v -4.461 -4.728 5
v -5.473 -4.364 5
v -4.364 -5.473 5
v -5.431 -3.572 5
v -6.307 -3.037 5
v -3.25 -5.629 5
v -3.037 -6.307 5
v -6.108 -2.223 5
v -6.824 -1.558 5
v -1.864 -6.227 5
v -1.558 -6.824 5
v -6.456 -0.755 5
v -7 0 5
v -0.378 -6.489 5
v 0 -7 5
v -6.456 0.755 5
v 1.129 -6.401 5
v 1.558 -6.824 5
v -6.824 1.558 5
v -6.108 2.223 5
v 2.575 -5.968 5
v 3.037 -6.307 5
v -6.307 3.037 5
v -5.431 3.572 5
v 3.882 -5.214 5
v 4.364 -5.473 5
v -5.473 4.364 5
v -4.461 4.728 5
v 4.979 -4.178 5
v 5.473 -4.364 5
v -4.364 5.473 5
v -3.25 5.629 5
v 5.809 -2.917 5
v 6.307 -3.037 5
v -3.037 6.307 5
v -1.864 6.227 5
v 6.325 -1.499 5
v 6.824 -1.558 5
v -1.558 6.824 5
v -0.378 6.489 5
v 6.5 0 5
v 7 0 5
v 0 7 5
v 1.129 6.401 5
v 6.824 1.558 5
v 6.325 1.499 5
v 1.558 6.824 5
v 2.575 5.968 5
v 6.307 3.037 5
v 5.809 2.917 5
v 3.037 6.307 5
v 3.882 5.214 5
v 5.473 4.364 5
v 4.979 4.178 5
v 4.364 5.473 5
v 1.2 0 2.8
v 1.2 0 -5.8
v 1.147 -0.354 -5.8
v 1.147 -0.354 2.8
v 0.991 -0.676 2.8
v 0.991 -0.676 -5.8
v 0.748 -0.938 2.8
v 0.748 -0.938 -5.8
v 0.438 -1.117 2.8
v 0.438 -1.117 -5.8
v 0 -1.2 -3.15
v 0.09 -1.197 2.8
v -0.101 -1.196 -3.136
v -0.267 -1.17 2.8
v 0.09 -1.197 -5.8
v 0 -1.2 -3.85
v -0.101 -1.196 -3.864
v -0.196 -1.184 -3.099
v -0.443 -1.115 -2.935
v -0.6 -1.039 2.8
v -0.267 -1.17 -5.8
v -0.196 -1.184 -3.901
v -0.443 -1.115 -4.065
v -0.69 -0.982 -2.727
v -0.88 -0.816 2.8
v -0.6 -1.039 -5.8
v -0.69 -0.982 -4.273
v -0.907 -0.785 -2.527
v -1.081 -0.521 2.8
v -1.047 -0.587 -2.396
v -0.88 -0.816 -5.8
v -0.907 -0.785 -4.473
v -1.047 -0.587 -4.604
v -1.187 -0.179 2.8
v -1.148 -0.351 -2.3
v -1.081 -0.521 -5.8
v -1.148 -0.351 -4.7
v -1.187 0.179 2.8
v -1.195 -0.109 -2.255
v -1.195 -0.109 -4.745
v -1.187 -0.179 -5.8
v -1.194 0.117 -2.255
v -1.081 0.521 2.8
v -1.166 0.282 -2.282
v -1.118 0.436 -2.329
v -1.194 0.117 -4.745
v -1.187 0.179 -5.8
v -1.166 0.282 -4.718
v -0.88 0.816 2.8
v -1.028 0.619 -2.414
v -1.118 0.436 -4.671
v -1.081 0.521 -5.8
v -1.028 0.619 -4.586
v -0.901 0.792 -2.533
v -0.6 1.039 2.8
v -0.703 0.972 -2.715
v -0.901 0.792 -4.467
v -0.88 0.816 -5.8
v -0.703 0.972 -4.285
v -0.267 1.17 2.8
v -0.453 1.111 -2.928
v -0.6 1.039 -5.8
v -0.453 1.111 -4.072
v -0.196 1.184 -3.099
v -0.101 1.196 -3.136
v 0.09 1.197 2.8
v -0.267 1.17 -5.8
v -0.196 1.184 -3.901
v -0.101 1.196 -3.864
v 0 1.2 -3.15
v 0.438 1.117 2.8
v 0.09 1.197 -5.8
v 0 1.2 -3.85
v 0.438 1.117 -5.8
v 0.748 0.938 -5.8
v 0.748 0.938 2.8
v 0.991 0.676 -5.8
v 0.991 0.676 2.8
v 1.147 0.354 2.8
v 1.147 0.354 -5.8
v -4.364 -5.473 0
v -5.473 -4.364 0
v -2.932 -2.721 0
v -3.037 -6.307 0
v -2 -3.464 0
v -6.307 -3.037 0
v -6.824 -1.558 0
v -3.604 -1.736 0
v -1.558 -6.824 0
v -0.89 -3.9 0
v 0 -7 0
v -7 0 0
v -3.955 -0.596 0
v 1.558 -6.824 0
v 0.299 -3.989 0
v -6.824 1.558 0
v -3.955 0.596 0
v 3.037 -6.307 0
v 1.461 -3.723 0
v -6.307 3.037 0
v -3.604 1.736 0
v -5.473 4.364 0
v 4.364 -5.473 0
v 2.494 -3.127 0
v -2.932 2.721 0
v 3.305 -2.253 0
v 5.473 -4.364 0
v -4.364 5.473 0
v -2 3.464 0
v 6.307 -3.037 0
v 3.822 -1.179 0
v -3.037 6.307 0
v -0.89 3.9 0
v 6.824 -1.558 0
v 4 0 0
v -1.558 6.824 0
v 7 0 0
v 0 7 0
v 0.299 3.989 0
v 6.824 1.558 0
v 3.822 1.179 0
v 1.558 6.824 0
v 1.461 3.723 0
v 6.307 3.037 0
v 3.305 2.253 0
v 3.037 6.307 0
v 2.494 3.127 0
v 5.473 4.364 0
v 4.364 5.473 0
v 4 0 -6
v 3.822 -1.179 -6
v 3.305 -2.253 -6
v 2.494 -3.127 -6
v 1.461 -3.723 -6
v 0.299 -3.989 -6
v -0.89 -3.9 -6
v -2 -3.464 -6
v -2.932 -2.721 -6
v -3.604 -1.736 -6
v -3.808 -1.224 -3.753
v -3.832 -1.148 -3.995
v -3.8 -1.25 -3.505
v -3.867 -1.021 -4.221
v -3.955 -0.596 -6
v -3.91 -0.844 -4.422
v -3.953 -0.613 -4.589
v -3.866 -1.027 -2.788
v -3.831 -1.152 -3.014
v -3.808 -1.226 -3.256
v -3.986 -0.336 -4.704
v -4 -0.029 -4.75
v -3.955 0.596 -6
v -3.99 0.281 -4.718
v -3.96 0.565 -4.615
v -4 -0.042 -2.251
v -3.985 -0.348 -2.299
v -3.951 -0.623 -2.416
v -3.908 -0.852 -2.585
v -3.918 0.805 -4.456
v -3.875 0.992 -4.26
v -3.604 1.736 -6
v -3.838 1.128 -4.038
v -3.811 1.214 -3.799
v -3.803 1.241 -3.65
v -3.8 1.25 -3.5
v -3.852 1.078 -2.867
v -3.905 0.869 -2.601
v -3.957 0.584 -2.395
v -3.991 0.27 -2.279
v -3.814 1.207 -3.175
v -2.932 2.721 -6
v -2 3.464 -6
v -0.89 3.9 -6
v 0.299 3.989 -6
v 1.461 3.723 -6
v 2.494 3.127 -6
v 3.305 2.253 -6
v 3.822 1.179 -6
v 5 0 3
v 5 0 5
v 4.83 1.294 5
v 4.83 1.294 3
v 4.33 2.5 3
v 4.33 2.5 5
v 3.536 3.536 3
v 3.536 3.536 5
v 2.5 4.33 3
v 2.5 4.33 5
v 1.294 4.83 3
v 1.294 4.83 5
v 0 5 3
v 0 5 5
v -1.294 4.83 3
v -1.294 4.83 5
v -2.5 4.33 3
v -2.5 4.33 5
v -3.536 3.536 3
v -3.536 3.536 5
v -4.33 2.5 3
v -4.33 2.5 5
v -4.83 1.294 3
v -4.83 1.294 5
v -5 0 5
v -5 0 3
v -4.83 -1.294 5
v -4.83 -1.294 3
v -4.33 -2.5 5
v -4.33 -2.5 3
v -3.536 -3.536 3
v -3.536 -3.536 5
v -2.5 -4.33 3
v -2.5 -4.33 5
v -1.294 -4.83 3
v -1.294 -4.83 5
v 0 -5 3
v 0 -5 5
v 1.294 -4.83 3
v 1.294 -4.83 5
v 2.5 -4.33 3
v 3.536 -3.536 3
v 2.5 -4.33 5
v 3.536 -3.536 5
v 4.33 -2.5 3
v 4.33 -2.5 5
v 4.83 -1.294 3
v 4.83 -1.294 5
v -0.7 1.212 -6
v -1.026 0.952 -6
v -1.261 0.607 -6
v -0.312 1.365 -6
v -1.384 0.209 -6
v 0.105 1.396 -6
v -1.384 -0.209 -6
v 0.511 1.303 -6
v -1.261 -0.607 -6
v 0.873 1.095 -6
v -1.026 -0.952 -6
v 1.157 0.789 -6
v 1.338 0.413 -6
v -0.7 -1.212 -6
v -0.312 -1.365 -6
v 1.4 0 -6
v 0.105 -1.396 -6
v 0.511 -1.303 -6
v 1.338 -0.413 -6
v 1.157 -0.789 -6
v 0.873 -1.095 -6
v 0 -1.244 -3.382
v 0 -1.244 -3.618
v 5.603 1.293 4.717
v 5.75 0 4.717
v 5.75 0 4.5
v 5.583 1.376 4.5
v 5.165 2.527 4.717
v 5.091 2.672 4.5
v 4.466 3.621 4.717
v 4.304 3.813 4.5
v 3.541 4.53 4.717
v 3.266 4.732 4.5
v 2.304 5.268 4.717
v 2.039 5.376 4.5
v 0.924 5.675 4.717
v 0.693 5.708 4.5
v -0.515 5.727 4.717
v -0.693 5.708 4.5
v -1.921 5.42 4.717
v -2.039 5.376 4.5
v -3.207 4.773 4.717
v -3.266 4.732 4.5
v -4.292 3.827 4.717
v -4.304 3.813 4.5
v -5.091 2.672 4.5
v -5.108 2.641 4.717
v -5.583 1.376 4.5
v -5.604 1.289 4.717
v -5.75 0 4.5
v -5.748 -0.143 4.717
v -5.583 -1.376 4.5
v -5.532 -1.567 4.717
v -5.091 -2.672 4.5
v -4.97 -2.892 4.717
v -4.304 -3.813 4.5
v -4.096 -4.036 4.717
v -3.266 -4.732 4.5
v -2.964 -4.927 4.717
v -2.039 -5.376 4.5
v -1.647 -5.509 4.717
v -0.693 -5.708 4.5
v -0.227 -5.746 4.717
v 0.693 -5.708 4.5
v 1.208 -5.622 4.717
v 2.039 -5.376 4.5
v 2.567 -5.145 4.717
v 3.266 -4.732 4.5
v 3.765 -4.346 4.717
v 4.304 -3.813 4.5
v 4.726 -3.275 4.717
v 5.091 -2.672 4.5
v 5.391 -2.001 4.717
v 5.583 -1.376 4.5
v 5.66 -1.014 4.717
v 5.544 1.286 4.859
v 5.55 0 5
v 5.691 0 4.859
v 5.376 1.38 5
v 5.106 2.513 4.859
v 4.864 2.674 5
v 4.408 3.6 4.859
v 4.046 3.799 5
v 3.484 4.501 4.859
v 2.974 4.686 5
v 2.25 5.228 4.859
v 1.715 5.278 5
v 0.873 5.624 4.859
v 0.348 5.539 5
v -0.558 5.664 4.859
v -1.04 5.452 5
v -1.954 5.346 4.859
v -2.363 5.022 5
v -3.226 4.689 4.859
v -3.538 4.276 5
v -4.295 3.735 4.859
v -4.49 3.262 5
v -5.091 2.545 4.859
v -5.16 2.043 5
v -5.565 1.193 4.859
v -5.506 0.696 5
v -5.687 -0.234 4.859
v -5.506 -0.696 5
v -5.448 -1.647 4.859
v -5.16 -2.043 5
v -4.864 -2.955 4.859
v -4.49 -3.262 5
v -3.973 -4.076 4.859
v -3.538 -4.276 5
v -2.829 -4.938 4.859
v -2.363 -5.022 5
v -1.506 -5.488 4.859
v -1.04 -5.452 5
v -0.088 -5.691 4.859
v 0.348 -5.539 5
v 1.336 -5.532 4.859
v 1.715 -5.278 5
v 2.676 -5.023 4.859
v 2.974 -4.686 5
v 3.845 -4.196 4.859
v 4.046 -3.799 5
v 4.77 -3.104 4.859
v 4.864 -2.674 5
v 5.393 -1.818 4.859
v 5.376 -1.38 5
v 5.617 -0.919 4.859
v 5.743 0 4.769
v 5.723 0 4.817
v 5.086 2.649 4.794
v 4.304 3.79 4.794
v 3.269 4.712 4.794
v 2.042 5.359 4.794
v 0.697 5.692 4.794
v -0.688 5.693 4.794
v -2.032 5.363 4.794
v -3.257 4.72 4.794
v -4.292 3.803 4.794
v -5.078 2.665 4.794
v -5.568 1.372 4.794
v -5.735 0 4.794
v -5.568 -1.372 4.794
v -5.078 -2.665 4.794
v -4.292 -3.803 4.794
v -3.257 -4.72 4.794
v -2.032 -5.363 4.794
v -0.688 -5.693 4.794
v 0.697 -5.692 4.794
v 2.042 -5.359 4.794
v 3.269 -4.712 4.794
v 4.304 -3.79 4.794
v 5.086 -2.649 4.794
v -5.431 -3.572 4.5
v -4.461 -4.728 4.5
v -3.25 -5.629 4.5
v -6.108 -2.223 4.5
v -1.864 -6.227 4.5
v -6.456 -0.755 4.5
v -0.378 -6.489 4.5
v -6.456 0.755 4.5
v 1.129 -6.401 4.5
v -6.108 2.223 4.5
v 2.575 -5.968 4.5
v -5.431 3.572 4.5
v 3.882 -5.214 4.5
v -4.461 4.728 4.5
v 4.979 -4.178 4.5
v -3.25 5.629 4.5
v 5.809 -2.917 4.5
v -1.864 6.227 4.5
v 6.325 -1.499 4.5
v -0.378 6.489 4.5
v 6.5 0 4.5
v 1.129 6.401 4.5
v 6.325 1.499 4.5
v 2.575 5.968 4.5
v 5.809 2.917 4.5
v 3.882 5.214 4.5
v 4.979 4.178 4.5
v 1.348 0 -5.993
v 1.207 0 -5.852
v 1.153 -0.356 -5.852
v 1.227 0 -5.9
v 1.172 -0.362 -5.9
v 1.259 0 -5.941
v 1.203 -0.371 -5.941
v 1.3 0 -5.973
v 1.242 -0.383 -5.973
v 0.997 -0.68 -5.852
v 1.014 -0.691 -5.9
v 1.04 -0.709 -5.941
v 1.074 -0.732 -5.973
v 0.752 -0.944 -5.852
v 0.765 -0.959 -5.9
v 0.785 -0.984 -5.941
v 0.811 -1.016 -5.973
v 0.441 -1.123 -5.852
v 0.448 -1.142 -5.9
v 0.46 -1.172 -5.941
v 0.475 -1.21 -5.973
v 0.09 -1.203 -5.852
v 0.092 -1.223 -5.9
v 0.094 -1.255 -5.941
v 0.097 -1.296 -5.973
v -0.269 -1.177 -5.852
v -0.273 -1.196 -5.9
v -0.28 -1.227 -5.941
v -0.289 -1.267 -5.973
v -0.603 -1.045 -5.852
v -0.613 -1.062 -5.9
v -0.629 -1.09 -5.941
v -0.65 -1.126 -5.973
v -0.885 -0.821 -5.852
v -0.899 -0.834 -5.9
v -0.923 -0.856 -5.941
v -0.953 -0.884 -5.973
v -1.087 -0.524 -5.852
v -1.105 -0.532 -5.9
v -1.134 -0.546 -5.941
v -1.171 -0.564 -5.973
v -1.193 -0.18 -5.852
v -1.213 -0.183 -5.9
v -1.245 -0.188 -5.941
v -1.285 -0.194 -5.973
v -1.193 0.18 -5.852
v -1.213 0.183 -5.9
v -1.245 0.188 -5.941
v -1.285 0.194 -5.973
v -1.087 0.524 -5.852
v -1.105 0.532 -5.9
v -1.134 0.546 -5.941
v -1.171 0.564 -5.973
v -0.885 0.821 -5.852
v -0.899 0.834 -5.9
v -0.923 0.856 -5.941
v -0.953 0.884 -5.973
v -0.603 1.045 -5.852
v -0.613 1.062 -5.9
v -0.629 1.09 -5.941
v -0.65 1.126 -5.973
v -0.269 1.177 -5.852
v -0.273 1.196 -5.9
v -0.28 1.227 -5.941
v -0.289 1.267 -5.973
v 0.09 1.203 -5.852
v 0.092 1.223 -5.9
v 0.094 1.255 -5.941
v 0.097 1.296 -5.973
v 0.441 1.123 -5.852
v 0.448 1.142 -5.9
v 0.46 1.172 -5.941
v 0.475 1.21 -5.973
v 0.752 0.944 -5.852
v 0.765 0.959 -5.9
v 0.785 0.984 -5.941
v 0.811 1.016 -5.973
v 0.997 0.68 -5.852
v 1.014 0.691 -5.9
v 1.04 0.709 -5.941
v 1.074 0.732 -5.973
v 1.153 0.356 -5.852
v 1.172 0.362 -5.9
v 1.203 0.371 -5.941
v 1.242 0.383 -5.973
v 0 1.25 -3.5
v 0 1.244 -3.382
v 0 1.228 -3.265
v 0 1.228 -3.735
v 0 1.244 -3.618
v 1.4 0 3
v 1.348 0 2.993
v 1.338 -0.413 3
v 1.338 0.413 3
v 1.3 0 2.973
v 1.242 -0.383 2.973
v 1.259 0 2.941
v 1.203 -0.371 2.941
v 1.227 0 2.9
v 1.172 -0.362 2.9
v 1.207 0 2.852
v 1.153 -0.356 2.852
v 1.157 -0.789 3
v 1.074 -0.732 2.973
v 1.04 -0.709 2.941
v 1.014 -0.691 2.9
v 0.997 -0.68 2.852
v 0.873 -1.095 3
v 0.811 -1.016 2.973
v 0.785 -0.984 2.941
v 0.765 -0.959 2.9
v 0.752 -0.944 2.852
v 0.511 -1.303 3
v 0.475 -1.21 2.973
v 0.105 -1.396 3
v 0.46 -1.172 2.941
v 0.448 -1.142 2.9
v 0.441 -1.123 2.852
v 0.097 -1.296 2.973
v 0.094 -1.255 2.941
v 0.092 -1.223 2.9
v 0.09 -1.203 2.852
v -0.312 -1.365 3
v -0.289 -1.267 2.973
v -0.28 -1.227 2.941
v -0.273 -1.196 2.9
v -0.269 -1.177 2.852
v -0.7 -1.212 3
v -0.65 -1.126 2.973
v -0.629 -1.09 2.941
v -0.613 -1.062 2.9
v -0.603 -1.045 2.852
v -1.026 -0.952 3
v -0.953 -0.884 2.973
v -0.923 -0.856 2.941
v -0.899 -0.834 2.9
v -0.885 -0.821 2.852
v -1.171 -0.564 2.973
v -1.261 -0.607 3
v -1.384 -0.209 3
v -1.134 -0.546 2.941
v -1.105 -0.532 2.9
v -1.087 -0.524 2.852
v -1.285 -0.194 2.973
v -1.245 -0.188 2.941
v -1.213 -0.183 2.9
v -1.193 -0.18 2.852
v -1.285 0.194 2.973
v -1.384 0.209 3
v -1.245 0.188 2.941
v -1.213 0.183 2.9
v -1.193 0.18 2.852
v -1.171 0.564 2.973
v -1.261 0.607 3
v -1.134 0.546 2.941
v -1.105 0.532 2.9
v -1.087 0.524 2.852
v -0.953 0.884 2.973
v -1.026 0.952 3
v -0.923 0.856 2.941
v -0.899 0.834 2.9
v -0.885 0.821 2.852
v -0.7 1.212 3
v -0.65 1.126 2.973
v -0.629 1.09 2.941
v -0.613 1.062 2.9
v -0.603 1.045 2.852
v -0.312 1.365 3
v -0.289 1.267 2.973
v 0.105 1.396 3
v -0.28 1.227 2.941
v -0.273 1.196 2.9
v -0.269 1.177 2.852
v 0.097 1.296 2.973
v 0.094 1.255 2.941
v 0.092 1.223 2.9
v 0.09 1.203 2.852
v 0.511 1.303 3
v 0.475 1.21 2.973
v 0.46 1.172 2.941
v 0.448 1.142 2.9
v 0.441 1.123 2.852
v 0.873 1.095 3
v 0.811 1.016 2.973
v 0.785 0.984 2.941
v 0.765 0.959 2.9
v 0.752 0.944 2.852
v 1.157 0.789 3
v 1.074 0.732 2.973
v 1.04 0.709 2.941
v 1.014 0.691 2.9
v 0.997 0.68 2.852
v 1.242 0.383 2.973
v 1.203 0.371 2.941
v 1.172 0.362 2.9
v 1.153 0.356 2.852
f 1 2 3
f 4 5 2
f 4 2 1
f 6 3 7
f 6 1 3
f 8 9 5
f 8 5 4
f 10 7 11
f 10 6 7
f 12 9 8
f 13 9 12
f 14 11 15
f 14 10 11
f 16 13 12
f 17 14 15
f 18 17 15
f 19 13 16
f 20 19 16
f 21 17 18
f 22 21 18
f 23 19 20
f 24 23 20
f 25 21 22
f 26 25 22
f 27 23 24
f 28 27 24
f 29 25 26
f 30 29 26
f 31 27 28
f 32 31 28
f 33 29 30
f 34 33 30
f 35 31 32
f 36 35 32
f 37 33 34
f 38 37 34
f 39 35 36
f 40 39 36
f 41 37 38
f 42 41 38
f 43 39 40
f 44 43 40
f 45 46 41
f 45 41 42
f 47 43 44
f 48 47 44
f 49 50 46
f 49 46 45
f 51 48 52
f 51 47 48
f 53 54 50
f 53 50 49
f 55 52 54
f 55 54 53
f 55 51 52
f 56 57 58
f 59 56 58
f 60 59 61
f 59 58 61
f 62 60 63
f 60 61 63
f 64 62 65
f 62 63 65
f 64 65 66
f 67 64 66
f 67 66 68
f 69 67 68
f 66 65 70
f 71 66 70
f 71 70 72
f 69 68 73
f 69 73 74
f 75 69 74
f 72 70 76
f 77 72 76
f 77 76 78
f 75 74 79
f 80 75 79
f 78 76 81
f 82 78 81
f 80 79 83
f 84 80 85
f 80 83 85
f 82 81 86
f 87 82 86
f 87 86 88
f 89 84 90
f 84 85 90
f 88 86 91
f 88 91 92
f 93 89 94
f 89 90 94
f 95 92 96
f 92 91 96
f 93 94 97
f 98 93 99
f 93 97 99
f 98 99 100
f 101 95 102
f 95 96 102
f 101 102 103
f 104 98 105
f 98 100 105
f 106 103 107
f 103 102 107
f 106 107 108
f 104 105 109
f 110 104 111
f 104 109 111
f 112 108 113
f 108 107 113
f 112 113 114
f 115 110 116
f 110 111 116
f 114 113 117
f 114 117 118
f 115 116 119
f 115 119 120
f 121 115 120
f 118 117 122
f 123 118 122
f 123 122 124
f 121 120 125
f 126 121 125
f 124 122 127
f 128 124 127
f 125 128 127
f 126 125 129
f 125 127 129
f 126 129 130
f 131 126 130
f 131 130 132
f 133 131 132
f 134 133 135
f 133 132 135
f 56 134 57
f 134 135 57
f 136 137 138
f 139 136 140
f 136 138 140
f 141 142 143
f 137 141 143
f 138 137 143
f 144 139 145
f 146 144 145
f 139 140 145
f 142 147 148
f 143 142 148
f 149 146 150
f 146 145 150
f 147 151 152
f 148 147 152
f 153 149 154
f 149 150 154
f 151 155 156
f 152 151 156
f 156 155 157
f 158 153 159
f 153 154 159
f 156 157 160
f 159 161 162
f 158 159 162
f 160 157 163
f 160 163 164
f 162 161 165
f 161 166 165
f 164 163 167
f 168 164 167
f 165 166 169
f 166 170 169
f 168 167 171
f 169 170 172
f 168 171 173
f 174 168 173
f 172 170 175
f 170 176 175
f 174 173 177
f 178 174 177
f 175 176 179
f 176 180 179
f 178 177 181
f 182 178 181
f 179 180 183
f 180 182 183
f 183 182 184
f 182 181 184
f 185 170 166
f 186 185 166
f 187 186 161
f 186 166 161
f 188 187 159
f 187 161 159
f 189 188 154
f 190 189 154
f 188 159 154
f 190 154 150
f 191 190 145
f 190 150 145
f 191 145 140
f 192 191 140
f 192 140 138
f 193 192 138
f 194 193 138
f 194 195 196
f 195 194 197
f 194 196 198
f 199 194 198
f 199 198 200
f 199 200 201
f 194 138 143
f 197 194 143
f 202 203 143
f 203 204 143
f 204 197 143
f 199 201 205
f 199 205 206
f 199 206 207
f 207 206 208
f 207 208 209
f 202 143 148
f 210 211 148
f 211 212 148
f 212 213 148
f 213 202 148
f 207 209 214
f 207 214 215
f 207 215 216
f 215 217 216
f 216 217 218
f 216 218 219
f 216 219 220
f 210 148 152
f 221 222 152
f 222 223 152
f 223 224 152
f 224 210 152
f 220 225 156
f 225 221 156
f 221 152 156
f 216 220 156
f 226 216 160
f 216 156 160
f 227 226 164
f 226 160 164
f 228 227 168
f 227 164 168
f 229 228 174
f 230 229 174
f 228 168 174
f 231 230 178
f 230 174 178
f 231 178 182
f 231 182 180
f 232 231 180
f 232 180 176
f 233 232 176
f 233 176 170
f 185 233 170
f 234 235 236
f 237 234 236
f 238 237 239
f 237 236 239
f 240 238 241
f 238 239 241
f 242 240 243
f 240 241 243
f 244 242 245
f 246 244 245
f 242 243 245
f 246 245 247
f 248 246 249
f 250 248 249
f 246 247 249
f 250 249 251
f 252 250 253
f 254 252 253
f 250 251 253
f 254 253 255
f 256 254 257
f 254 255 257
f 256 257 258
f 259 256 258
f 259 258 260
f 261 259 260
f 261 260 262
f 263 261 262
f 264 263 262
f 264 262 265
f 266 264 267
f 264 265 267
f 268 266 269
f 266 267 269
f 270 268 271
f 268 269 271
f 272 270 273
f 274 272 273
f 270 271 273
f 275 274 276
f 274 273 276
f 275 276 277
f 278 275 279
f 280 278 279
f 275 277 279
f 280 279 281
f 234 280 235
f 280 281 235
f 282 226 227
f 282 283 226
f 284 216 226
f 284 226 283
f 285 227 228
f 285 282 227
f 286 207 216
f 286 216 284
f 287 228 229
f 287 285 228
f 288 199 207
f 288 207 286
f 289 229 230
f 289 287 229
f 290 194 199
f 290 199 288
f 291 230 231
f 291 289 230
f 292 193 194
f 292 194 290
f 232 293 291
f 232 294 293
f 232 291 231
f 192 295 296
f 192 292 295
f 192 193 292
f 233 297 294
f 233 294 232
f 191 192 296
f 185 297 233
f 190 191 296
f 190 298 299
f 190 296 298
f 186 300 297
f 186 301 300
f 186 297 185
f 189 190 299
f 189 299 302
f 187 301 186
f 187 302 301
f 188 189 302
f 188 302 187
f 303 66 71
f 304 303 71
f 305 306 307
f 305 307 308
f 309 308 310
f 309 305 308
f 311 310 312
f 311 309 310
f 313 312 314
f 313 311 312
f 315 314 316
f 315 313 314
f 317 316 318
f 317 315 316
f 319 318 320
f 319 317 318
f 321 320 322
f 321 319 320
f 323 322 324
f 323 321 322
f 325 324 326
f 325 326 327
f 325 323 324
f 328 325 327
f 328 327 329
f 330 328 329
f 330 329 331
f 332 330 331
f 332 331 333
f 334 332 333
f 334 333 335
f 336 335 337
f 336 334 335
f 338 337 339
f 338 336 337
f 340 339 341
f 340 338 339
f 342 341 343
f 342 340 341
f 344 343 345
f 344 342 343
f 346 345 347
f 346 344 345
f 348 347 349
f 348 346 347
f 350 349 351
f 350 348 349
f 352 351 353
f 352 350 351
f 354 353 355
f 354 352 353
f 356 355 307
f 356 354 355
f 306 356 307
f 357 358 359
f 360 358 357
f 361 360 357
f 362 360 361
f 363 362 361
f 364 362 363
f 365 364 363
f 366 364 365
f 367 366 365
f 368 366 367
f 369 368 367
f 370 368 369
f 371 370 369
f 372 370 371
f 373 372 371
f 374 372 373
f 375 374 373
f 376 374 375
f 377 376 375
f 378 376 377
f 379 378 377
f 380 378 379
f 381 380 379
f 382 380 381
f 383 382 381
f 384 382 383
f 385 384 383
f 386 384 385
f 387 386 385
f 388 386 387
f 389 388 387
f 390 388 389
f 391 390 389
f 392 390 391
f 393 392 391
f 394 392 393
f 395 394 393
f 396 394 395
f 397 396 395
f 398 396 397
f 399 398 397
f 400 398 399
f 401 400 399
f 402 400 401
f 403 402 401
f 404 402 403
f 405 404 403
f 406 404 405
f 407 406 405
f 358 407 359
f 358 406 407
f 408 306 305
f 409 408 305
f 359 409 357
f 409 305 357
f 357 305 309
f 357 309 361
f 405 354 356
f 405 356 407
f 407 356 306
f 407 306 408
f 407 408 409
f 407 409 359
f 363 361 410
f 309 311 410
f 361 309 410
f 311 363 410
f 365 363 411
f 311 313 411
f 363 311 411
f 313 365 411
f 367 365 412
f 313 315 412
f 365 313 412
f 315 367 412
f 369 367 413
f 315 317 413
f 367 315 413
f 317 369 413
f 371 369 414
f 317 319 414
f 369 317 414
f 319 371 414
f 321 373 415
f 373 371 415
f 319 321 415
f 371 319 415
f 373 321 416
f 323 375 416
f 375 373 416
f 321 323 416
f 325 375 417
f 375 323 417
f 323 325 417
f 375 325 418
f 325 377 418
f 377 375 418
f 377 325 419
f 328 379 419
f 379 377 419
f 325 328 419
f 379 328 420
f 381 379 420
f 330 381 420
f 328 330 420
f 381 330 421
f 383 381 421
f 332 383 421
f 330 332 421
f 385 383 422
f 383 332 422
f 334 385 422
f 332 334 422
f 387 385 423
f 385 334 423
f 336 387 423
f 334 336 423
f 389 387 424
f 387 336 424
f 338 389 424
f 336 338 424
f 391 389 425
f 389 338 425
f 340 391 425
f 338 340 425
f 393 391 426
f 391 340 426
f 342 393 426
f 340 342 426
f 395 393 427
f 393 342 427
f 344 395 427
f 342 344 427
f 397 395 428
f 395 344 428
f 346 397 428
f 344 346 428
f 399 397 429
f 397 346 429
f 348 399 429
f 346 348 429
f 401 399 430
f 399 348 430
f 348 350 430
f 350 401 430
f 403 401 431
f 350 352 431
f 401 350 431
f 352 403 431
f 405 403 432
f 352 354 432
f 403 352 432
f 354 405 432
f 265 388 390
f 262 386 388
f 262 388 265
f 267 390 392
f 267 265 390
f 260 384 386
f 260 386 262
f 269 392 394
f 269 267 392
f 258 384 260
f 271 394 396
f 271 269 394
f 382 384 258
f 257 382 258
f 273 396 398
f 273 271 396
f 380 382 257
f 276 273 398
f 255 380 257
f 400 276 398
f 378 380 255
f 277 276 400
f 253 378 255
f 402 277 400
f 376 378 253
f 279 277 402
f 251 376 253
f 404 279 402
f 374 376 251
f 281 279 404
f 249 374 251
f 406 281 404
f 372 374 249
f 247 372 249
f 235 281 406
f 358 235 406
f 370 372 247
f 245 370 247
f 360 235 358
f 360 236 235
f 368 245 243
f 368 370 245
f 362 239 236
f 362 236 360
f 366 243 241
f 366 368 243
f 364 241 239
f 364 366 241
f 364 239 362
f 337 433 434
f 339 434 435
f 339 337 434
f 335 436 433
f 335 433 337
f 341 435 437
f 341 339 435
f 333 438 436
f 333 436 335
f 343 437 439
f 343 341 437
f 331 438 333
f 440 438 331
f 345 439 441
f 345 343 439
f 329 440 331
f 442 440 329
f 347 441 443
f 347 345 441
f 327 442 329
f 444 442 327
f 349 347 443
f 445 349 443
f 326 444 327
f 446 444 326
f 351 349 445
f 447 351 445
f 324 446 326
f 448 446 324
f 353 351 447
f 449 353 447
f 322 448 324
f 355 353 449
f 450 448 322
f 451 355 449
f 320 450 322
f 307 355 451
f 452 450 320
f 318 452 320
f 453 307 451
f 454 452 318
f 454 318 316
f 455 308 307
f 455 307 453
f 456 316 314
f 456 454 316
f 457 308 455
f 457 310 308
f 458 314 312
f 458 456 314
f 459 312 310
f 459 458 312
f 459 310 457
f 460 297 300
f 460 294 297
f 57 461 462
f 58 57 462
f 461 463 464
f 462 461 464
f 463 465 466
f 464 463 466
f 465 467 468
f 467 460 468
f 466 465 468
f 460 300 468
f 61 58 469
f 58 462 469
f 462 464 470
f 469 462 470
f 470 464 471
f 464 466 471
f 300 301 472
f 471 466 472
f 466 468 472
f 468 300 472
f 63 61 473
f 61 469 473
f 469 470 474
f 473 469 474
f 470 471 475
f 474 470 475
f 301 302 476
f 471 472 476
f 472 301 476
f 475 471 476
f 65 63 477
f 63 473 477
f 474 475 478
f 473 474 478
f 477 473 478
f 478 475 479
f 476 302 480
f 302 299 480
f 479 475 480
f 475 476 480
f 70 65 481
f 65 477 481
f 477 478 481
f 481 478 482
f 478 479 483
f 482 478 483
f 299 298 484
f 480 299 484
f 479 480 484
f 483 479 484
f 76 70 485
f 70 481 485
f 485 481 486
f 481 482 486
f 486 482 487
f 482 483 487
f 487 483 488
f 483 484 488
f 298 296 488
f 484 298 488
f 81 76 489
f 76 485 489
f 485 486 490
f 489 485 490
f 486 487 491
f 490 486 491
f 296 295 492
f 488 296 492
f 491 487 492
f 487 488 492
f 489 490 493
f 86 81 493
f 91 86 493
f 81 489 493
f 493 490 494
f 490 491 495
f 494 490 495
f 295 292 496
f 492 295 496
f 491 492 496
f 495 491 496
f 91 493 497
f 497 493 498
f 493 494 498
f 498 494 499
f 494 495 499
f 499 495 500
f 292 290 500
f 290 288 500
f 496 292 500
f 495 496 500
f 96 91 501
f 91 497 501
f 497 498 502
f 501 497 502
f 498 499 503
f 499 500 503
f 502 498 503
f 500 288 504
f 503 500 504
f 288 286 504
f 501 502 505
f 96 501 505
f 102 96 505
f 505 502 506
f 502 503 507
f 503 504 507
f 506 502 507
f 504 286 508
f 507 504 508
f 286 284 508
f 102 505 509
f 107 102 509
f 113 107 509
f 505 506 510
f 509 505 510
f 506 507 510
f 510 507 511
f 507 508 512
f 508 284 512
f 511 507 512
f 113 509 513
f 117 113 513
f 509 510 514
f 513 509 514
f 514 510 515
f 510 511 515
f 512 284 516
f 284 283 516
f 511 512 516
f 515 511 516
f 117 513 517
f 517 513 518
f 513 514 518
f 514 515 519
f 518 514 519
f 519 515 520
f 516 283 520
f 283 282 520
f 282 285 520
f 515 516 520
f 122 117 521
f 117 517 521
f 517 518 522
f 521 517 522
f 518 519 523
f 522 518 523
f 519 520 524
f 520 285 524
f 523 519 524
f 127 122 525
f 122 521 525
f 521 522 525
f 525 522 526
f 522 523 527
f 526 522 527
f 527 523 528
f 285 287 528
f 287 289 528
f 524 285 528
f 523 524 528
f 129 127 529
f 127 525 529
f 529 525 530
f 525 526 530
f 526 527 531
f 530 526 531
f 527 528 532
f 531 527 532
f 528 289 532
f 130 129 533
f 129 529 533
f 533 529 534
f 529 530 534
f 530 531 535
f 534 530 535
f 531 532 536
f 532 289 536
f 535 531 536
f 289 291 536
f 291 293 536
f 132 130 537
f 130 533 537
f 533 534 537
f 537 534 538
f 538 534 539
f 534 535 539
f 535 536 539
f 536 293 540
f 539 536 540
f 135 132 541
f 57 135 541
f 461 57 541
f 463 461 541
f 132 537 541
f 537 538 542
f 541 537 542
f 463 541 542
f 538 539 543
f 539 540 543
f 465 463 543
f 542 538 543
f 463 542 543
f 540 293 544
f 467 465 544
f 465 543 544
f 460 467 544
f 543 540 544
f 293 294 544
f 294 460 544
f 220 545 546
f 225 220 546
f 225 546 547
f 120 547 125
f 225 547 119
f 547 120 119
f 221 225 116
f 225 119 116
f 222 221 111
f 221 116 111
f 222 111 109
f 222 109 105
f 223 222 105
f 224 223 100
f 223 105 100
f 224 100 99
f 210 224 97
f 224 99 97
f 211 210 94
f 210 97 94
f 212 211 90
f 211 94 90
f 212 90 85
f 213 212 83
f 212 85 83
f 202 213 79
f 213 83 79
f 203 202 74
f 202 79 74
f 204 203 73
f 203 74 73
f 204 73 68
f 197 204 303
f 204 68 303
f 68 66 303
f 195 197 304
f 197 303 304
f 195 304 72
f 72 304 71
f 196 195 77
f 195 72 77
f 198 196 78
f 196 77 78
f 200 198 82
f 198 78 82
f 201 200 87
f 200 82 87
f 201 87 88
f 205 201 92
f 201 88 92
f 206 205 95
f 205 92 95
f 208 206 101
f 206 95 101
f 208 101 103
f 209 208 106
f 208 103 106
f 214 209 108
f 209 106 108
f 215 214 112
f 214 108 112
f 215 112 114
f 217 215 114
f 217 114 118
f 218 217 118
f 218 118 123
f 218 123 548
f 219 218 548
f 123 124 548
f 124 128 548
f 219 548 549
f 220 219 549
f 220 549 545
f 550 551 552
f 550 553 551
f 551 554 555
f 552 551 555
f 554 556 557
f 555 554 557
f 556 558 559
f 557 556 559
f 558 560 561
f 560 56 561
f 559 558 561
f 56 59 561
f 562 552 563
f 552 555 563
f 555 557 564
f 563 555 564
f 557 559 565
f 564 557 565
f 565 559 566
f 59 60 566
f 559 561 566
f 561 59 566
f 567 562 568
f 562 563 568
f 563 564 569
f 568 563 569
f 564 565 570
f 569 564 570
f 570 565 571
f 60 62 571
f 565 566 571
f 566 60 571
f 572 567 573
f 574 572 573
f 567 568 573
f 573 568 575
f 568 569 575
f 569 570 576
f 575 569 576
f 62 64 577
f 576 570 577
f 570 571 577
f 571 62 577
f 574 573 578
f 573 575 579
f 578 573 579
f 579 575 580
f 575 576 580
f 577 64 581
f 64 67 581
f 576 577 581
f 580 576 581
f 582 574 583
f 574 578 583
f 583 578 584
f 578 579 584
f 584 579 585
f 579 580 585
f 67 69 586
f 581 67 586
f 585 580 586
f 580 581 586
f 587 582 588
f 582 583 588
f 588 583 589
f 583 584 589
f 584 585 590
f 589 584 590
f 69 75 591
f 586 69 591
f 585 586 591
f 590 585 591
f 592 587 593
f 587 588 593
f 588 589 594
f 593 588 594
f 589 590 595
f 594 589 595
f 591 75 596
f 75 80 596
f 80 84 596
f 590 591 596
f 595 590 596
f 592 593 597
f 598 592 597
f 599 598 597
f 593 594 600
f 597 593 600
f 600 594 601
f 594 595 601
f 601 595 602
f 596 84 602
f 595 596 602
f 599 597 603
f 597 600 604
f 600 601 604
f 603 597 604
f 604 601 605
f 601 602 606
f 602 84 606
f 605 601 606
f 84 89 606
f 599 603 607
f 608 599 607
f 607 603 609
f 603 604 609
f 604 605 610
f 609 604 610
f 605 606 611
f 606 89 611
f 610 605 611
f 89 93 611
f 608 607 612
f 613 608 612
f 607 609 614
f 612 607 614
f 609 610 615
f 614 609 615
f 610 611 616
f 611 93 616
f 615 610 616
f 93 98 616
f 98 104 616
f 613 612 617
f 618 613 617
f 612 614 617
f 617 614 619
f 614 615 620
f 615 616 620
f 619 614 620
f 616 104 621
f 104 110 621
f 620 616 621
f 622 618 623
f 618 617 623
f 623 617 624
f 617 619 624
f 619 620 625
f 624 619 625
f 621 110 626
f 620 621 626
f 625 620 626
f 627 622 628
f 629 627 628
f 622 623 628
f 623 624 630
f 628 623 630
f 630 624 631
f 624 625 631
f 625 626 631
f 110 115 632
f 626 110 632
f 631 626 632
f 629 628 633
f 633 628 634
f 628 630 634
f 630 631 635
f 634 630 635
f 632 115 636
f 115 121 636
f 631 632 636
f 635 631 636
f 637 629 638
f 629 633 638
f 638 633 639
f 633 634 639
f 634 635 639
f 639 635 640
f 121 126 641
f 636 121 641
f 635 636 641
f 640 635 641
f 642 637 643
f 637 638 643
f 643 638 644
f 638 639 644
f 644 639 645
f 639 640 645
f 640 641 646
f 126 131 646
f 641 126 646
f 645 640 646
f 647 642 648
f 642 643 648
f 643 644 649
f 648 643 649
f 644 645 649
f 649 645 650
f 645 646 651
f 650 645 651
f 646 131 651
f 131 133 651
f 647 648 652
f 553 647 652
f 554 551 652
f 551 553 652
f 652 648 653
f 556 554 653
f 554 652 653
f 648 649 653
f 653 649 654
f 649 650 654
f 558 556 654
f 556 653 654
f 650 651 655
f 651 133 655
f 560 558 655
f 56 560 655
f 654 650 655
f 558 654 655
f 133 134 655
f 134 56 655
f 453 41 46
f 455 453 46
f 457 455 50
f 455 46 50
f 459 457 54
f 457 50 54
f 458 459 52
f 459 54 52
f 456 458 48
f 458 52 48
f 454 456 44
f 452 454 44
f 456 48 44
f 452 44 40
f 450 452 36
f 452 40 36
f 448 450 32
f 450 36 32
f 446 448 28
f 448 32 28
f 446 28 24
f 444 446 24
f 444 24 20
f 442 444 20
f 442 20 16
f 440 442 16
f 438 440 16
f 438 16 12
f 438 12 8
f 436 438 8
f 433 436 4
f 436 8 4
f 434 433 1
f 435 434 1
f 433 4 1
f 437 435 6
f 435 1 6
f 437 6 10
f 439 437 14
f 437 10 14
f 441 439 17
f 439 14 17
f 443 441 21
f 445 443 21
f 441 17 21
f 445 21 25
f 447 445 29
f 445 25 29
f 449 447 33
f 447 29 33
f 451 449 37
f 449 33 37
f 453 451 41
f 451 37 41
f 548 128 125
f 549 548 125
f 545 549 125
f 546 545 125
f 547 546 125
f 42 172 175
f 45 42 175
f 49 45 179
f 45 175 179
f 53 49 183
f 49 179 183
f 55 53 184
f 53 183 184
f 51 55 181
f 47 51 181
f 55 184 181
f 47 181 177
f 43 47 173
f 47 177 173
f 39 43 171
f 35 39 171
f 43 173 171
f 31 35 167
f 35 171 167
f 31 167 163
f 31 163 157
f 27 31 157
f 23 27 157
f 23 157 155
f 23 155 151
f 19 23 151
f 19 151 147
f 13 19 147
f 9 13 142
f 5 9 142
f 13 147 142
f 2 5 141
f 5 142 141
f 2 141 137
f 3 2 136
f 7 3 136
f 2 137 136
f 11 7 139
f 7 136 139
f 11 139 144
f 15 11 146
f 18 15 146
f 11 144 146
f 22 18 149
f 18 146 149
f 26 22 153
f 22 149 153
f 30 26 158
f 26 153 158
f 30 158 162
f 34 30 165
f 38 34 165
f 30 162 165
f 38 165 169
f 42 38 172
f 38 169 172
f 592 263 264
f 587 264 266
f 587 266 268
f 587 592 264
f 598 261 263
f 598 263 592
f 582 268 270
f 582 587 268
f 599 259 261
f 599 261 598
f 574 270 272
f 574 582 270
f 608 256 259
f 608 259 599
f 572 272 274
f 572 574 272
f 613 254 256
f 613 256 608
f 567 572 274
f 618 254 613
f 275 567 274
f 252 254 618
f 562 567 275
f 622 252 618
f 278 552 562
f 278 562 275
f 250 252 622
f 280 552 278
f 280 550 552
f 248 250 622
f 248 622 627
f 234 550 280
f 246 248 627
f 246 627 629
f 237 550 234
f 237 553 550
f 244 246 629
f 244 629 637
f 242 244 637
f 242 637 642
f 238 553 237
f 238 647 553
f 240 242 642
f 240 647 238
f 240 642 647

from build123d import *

# Parameters (mm, degrees)
F0_R      = 7
F1_DEPTH  = 5
F2_R      = 4
F3_DEPTH  = 6
F4_R      = 1.2
F5_DEPTH  = 9
F6_R      = 5
F7_DEPTH  = 2
F8_R      = 6.5
F8_R_2    = 5.75
F9_DEPTH  = 0.5
F10_SIZE  = 0.2
F11_R     = 0.2
F13_R     = 1.25
F14_DEPTH = 4.5


with BuildPart() as f1:
    # F0 (on Top) → F1 (new body)
    with BuildSketch(Plane.XY):
        Circle(F0_R)
    extrude(amount=F1_DEPTH)

    # F2 (on face) → F3 (join)
    with BuildSketch(Plane(origin=(0, 0, 0), x_dir=(1, 0, 0), z_dir=(0, 0, -1))):
        Circle(F2_R)
    extrude(amount=F3_DEPTH)

    # F4 (on face) → F5 (cut)
    with BuildSketch(Plane(origin=(0, 0, -6), x_dir=(1, 0, 0), z_dir=(0, 0, -1))):
        Circle(F4_R)
    extrude(amount=-F5_DEPTH, mode=Mode.SUBTRACT)

    # F6 (on face) → F7 (cut)
    with BuildSketch(Plane.XY.offset(5)):
        Circle(F6_R)
    extrude(amount=-F7_DEPTH, mode=Mode.SUBTRACT)

    # F8 (on face) → F9 (cut)
    with BuildSketch(Plane.XY.offset(5)):
        Circle(F8_R)
        Circle(F8_R_2, mode=Mode.SUBTRACT)
    extrude(amount=-F9_DEPTH, mode=Mode.SUBTRACT)

    # F10
    f10_edges = [f1.edges().sort_by_distance(p)[0] for p in [
        (-5.75, 0, 5),
    ]]
    chamfer(f10_edges, length=F10_SIZE)

    # F11
    f11_edges = [f1.edges().sort_by_distance(p)[0] for p in [
        (-5.75, 0, 4.8),
        (-1.2, 0, 3),
        (-1.2, 0, -6),
    ]]
    fillet(f11_edges, radius=F11_R)

    # F13 (on Right) → F14 (cut)
    with BuildSketch(Plane.YZ):
        with Locations((0, -3.5)):
            Circle(F13_R)
    extrude(amount=-F14_DEPTH, mode=Mode.SUBTRACT)


solid = f1.part
